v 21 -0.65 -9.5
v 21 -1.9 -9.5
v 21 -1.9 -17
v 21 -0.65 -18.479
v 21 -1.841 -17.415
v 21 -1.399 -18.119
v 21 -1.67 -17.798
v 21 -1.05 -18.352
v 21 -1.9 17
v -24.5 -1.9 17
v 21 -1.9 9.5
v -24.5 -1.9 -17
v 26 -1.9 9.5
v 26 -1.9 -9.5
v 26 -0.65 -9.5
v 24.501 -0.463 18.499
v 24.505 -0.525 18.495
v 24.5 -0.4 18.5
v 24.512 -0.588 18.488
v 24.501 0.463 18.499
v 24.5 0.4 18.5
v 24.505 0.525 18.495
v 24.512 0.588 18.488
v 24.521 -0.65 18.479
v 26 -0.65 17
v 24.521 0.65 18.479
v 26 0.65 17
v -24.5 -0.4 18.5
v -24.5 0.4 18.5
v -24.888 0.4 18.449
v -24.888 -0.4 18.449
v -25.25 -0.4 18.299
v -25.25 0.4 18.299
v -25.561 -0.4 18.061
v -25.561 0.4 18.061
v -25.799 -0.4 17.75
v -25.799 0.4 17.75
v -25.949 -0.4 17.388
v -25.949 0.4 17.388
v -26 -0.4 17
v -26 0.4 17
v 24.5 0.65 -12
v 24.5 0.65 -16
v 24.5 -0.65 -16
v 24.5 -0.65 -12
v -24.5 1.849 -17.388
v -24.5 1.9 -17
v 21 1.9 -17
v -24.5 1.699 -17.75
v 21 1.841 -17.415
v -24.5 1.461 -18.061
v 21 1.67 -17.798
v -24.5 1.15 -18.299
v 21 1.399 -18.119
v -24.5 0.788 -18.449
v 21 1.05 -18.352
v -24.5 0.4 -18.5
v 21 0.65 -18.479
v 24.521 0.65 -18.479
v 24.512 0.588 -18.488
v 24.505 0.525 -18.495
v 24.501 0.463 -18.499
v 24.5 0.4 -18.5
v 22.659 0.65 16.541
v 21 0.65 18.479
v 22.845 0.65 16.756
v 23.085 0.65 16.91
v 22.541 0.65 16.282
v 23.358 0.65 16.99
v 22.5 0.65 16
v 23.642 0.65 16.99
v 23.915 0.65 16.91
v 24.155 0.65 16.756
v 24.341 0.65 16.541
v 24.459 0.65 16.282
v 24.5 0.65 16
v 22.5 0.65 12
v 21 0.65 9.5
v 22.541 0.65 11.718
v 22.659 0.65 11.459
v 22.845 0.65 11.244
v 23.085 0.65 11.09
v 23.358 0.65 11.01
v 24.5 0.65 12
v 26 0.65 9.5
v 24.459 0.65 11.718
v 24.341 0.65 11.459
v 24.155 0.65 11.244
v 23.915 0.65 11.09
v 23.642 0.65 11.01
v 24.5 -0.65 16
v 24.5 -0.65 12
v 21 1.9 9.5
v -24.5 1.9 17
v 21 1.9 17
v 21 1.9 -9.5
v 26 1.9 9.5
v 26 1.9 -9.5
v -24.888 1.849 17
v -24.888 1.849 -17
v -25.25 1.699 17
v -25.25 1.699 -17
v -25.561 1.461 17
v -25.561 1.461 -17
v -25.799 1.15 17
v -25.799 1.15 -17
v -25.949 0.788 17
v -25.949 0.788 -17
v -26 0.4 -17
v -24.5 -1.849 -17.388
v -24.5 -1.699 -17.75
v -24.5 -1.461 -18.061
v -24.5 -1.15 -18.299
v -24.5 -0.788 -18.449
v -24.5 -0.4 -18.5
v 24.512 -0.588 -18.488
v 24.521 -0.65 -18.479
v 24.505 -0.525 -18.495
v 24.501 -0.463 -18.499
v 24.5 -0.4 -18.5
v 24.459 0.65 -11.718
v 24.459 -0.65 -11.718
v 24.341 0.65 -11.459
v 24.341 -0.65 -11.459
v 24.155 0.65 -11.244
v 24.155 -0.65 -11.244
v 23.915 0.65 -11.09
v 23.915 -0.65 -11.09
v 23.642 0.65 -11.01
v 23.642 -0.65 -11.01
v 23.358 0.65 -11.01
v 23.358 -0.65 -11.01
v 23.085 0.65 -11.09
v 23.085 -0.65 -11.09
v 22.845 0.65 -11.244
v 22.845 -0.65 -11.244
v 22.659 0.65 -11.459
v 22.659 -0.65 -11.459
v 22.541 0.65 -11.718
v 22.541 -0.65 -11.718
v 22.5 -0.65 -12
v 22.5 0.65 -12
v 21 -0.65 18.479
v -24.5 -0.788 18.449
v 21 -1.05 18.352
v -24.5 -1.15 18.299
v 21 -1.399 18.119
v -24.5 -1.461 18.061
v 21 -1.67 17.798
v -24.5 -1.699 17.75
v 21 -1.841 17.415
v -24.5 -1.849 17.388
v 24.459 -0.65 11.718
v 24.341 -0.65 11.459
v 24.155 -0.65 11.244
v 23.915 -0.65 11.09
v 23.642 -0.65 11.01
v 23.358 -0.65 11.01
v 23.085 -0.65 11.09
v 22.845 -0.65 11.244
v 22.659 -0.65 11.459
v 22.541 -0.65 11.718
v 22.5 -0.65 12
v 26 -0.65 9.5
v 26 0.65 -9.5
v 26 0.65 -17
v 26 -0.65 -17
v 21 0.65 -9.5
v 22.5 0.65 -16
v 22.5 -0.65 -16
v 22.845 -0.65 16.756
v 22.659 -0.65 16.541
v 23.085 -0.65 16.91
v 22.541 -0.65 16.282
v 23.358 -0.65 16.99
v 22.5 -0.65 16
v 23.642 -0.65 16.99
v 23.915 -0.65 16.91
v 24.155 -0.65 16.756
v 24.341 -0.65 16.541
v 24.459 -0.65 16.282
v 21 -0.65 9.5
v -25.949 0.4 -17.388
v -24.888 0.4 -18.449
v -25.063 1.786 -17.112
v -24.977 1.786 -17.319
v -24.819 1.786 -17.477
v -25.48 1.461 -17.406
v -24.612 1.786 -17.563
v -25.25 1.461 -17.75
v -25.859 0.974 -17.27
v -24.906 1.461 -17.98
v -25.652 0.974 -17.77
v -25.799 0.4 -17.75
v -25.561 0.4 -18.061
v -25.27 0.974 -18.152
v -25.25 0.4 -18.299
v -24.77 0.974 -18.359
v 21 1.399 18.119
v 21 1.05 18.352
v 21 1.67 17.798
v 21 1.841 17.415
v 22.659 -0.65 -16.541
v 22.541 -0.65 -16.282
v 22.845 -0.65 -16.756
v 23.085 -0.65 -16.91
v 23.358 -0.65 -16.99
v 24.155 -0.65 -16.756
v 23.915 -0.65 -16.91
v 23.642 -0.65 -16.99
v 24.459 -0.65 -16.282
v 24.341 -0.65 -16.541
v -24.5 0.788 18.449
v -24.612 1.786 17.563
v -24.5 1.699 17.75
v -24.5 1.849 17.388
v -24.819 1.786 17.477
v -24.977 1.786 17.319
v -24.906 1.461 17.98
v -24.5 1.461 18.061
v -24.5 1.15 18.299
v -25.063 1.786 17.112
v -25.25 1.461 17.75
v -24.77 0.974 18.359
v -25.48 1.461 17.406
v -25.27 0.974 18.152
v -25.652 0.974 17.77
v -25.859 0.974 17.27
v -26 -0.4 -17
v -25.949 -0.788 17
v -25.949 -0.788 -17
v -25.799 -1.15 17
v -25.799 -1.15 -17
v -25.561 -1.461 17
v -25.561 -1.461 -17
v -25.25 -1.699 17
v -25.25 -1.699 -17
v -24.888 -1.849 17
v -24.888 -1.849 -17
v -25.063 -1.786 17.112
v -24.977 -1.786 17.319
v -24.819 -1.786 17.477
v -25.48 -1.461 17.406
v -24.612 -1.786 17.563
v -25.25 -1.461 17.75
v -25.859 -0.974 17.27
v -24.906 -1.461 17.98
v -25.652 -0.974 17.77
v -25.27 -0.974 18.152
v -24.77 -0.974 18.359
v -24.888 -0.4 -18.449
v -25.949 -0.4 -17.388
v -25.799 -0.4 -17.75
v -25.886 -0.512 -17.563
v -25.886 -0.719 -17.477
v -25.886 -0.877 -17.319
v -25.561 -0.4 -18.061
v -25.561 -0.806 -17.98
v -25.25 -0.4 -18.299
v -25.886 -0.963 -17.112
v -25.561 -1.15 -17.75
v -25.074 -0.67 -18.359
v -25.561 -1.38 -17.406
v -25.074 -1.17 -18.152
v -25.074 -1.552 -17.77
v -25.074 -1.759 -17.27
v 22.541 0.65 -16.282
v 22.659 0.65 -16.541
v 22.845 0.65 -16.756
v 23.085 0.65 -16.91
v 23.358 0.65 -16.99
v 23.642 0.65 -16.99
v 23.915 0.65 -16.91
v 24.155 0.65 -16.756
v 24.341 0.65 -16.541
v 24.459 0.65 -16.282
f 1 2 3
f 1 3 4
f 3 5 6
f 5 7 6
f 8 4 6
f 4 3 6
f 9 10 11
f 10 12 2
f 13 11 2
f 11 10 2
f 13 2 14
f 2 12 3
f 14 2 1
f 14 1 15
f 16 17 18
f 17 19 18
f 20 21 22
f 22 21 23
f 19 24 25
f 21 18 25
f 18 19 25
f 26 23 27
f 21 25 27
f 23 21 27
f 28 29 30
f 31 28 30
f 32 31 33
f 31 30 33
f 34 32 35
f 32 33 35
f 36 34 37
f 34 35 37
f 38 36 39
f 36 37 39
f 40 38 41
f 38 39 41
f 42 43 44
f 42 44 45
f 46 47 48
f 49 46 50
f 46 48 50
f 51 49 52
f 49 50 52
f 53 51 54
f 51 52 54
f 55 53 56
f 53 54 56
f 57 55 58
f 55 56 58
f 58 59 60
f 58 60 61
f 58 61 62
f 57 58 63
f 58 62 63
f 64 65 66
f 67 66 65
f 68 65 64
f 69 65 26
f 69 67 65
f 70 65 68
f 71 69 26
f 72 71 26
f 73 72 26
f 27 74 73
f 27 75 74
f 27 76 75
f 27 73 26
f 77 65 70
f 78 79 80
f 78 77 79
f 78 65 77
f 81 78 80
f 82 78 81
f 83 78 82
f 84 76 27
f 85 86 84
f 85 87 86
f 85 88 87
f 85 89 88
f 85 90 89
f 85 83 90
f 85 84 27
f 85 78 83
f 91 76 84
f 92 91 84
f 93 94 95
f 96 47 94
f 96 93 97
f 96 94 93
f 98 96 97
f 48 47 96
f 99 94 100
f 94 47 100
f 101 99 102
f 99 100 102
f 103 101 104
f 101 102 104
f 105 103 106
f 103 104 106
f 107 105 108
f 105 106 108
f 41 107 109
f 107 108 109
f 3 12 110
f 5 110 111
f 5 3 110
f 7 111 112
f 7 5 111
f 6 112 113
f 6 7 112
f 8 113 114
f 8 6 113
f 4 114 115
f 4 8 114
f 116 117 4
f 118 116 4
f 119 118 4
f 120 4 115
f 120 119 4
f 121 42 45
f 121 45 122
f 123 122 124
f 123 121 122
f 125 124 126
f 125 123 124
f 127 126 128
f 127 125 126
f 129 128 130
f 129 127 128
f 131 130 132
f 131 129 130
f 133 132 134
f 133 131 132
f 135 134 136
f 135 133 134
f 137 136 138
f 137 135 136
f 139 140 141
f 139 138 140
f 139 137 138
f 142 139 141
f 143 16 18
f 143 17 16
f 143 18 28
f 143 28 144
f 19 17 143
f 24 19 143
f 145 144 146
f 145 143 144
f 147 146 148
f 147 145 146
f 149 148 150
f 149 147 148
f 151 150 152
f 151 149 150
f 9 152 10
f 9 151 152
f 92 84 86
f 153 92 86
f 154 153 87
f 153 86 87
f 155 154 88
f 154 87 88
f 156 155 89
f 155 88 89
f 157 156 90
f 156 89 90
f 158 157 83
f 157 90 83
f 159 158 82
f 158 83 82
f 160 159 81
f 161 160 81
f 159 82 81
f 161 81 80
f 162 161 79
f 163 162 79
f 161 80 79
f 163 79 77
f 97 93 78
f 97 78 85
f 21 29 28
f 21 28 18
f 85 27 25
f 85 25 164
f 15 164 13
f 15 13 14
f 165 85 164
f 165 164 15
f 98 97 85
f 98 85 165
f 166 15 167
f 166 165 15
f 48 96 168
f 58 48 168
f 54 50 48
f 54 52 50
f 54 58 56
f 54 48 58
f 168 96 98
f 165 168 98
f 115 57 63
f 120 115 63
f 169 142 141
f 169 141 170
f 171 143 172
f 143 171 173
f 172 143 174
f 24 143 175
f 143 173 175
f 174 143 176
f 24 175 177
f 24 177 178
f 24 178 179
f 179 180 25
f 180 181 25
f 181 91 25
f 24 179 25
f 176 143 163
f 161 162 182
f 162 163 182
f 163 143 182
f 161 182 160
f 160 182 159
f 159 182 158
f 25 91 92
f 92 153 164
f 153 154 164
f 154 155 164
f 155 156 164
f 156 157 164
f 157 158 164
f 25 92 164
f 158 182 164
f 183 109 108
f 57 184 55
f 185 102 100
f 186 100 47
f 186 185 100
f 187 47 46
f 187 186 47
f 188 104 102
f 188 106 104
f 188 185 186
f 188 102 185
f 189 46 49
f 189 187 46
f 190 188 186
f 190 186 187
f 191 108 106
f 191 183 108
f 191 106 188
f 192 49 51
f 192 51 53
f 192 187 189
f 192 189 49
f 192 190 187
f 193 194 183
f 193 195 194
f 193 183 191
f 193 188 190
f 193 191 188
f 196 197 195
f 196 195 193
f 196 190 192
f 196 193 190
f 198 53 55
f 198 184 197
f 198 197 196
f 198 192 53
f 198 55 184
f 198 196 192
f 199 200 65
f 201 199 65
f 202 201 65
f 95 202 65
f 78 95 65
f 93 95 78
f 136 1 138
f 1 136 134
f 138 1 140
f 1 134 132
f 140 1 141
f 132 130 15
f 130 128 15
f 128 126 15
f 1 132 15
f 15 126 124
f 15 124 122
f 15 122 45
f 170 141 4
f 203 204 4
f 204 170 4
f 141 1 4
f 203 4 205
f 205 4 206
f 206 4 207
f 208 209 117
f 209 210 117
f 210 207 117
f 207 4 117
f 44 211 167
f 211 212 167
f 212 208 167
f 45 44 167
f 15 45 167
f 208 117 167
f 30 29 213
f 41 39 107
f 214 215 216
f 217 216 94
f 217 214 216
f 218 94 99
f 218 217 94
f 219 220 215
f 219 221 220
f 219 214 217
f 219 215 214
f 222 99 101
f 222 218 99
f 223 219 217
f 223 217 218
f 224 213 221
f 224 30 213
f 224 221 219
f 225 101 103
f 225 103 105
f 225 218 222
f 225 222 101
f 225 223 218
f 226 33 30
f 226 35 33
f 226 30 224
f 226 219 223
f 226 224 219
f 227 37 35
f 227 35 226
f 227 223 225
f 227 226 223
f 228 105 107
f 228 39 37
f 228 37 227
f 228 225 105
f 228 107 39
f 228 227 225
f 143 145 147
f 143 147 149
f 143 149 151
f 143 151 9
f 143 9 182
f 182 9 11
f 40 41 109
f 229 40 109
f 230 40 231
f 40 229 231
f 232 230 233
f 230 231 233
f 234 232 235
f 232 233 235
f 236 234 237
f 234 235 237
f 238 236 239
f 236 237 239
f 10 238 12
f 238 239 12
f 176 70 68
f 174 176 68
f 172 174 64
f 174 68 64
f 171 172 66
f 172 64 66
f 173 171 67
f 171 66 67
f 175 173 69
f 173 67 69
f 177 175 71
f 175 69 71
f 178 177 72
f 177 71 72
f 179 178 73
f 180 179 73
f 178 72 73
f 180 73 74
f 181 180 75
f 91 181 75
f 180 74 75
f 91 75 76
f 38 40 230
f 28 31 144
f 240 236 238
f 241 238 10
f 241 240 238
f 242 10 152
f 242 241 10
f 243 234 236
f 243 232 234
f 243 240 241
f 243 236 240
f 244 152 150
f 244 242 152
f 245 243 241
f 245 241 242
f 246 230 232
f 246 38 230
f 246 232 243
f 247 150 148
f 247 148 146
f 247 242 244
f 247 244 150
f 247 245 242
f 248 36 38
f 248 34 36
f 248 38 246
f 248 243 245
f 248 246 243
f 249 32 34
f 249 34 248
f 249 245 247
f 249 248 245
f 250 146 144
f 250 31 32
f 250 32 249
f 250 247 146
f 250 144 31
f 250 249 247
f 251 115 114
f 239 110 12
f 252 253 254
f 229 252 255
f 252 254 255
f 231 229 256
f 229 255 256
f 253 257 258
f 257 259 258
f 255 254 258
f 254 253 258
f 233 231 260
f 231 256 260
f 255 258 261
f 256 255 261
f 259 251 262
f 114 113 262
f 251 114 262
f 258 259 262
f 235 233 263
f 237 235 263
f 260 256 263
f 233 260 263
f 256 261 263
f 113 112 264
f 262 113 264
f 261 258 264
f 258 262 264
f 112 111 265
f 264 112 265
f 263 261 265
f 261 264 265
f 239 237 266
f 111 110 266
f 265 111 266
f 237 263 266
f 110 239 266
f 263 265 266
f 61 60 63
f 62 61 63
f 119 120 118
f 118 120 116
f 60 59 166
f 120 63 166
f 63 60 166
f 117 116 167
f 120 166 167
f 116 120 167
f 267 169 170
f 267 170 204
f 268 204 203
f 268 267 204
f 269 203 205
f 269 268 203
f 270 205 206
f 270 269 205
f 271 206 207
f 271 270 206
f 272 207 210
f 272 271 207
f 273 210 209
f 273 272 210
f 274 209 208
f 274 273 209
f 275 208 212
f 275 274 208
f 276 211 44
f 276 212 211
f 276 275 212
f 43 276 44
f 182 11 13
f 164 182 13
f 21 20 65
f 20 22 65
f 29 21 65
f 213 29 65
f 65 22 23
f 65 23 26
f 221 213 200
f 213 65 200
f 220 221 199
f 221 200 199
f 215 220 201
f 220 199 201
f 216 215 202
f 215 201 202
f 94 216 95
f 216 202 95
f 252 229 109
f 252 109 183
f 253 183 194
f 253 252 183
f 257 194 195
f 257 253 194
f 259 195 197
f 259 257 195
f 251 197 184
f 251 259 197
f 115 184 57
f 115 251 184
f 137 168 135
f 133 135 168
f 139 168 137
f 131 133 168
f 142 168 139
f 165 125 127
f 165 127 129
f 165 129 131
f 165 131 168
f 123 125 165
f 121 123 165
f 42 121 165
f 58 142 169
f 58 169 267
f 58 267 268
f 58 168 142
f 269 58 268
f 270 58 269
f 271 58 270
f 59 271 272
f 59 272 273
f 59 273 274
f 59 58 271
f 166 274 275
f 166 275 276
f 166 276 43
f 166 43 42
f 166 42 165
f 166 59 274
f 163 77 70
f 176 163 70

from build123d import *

# Parameters (mm, degrees)
SKETCH1_W           = 52
SKETCH1_H           = 37
BOSS_EXTRUDE1_DEPTH = 1.9
SKETCH2_W           = 5
SKETCH2_H           = 9
CUT_EXTRUDE1_DEPTH  = 1.25
CUT_EXTRUDE2_DEPTH  = 3.55
CHAMFER1_SIZE       = 1.5
FILLET2_R           = 1.5


with BuildPart() as part:
    # Sketch1 → Boss-Extrude1 (new body, symmetric)
    with BuildSketch(Plane(origin=(0, 0, 0), x_dir=(1, 0, 0), z_dir=(0, 1, 0))):
        Rectangle(SKETCH1_W, SKETCH1_H)
    extrude(amount=BOSS_EXTRUDE1_DEPTH, both=True)

    # Sketch2 → Cut-Extrude1 (cut)
    with BuildSketch(Plane(origin=(0, 1.9, 0), x_dir=(1, 0, 0), z_dir=(0, 1, 0))):
        with Locations((23.5, 14)):
            Rectangle(SKETCH2_W, SKETCH2_H)
        with Locations((23.5, -14)):
            Rectangle(SKETCH2_W, SKETCH2_H)
    cut_extrude1 = extrude(amount=-CUT_EXTRUDE1_DEPTH, mode=Mode.SUBTRACT)

    # Mirror1: Cut-Extrude1 across plane
    add(cut_extrude1.mirror(Plane.ZX), mode=Mode.SUBTRACT)

    # Sketch3 → Cut-Extrude2 (cut, through all)
    with BuildSketch(Plane(origin=(0, 0.65, 0), x_dir=(1, 0, 0), z_dir=(0, 1, 0))):
        with BuildLine():
            Line((22.5, 12), (22.5, 16))
            ThreePointArc((22.5, 16), (23.5, 17), (24.5, 16))
            Line((24.5, 16), (24.5, 12))
            ThreePointArc((24.5, 12), (23.5, 11), (22.5, 12))
        make_face()
        with BuildLine():
            Line((22.5, -12), (22.5, -16))
            ThreePointArc((22.5, -16), (23.5, -17), (24.5, -16))
            Line((24.5, -16), (24.5, -12))
            ThreePointArc((24.5, -12), (23.5, -11), (22.5, -12))
        make_face()
    extrude(amount=-CUT_EXTRUDE2_DEPTH, mode=Mode.SUBTRACT)

    # Chamfer1
    chamfer1_edges = [part.edges().sort_by_distance(p)[0] for p in [
        (26, 0, -18.5),
        (26, 0, 18.5),
    ]]
    chamfer(chamfer1_edges, length=CHAMFER1_SIZE)

    # Fillet2
    fillet2_edges = [part.edges().sort_by_distance(p)[0] for p in [
        (-2.5, -1.9, -18.5),
        (-26, 0, -18.5),
        (-26, 0, 18.5),
        (-26, -1.9, 0),
        (-2.5, -1.9, 18.5),
        (-2.5, 1.9, 18.5),
        (-26, 1.9, 0),
        (-2.5, 1.9, -18.5),
    ]]
    fillet(fillet2_edges, radius=FILLET2_R)


solid = part.part
